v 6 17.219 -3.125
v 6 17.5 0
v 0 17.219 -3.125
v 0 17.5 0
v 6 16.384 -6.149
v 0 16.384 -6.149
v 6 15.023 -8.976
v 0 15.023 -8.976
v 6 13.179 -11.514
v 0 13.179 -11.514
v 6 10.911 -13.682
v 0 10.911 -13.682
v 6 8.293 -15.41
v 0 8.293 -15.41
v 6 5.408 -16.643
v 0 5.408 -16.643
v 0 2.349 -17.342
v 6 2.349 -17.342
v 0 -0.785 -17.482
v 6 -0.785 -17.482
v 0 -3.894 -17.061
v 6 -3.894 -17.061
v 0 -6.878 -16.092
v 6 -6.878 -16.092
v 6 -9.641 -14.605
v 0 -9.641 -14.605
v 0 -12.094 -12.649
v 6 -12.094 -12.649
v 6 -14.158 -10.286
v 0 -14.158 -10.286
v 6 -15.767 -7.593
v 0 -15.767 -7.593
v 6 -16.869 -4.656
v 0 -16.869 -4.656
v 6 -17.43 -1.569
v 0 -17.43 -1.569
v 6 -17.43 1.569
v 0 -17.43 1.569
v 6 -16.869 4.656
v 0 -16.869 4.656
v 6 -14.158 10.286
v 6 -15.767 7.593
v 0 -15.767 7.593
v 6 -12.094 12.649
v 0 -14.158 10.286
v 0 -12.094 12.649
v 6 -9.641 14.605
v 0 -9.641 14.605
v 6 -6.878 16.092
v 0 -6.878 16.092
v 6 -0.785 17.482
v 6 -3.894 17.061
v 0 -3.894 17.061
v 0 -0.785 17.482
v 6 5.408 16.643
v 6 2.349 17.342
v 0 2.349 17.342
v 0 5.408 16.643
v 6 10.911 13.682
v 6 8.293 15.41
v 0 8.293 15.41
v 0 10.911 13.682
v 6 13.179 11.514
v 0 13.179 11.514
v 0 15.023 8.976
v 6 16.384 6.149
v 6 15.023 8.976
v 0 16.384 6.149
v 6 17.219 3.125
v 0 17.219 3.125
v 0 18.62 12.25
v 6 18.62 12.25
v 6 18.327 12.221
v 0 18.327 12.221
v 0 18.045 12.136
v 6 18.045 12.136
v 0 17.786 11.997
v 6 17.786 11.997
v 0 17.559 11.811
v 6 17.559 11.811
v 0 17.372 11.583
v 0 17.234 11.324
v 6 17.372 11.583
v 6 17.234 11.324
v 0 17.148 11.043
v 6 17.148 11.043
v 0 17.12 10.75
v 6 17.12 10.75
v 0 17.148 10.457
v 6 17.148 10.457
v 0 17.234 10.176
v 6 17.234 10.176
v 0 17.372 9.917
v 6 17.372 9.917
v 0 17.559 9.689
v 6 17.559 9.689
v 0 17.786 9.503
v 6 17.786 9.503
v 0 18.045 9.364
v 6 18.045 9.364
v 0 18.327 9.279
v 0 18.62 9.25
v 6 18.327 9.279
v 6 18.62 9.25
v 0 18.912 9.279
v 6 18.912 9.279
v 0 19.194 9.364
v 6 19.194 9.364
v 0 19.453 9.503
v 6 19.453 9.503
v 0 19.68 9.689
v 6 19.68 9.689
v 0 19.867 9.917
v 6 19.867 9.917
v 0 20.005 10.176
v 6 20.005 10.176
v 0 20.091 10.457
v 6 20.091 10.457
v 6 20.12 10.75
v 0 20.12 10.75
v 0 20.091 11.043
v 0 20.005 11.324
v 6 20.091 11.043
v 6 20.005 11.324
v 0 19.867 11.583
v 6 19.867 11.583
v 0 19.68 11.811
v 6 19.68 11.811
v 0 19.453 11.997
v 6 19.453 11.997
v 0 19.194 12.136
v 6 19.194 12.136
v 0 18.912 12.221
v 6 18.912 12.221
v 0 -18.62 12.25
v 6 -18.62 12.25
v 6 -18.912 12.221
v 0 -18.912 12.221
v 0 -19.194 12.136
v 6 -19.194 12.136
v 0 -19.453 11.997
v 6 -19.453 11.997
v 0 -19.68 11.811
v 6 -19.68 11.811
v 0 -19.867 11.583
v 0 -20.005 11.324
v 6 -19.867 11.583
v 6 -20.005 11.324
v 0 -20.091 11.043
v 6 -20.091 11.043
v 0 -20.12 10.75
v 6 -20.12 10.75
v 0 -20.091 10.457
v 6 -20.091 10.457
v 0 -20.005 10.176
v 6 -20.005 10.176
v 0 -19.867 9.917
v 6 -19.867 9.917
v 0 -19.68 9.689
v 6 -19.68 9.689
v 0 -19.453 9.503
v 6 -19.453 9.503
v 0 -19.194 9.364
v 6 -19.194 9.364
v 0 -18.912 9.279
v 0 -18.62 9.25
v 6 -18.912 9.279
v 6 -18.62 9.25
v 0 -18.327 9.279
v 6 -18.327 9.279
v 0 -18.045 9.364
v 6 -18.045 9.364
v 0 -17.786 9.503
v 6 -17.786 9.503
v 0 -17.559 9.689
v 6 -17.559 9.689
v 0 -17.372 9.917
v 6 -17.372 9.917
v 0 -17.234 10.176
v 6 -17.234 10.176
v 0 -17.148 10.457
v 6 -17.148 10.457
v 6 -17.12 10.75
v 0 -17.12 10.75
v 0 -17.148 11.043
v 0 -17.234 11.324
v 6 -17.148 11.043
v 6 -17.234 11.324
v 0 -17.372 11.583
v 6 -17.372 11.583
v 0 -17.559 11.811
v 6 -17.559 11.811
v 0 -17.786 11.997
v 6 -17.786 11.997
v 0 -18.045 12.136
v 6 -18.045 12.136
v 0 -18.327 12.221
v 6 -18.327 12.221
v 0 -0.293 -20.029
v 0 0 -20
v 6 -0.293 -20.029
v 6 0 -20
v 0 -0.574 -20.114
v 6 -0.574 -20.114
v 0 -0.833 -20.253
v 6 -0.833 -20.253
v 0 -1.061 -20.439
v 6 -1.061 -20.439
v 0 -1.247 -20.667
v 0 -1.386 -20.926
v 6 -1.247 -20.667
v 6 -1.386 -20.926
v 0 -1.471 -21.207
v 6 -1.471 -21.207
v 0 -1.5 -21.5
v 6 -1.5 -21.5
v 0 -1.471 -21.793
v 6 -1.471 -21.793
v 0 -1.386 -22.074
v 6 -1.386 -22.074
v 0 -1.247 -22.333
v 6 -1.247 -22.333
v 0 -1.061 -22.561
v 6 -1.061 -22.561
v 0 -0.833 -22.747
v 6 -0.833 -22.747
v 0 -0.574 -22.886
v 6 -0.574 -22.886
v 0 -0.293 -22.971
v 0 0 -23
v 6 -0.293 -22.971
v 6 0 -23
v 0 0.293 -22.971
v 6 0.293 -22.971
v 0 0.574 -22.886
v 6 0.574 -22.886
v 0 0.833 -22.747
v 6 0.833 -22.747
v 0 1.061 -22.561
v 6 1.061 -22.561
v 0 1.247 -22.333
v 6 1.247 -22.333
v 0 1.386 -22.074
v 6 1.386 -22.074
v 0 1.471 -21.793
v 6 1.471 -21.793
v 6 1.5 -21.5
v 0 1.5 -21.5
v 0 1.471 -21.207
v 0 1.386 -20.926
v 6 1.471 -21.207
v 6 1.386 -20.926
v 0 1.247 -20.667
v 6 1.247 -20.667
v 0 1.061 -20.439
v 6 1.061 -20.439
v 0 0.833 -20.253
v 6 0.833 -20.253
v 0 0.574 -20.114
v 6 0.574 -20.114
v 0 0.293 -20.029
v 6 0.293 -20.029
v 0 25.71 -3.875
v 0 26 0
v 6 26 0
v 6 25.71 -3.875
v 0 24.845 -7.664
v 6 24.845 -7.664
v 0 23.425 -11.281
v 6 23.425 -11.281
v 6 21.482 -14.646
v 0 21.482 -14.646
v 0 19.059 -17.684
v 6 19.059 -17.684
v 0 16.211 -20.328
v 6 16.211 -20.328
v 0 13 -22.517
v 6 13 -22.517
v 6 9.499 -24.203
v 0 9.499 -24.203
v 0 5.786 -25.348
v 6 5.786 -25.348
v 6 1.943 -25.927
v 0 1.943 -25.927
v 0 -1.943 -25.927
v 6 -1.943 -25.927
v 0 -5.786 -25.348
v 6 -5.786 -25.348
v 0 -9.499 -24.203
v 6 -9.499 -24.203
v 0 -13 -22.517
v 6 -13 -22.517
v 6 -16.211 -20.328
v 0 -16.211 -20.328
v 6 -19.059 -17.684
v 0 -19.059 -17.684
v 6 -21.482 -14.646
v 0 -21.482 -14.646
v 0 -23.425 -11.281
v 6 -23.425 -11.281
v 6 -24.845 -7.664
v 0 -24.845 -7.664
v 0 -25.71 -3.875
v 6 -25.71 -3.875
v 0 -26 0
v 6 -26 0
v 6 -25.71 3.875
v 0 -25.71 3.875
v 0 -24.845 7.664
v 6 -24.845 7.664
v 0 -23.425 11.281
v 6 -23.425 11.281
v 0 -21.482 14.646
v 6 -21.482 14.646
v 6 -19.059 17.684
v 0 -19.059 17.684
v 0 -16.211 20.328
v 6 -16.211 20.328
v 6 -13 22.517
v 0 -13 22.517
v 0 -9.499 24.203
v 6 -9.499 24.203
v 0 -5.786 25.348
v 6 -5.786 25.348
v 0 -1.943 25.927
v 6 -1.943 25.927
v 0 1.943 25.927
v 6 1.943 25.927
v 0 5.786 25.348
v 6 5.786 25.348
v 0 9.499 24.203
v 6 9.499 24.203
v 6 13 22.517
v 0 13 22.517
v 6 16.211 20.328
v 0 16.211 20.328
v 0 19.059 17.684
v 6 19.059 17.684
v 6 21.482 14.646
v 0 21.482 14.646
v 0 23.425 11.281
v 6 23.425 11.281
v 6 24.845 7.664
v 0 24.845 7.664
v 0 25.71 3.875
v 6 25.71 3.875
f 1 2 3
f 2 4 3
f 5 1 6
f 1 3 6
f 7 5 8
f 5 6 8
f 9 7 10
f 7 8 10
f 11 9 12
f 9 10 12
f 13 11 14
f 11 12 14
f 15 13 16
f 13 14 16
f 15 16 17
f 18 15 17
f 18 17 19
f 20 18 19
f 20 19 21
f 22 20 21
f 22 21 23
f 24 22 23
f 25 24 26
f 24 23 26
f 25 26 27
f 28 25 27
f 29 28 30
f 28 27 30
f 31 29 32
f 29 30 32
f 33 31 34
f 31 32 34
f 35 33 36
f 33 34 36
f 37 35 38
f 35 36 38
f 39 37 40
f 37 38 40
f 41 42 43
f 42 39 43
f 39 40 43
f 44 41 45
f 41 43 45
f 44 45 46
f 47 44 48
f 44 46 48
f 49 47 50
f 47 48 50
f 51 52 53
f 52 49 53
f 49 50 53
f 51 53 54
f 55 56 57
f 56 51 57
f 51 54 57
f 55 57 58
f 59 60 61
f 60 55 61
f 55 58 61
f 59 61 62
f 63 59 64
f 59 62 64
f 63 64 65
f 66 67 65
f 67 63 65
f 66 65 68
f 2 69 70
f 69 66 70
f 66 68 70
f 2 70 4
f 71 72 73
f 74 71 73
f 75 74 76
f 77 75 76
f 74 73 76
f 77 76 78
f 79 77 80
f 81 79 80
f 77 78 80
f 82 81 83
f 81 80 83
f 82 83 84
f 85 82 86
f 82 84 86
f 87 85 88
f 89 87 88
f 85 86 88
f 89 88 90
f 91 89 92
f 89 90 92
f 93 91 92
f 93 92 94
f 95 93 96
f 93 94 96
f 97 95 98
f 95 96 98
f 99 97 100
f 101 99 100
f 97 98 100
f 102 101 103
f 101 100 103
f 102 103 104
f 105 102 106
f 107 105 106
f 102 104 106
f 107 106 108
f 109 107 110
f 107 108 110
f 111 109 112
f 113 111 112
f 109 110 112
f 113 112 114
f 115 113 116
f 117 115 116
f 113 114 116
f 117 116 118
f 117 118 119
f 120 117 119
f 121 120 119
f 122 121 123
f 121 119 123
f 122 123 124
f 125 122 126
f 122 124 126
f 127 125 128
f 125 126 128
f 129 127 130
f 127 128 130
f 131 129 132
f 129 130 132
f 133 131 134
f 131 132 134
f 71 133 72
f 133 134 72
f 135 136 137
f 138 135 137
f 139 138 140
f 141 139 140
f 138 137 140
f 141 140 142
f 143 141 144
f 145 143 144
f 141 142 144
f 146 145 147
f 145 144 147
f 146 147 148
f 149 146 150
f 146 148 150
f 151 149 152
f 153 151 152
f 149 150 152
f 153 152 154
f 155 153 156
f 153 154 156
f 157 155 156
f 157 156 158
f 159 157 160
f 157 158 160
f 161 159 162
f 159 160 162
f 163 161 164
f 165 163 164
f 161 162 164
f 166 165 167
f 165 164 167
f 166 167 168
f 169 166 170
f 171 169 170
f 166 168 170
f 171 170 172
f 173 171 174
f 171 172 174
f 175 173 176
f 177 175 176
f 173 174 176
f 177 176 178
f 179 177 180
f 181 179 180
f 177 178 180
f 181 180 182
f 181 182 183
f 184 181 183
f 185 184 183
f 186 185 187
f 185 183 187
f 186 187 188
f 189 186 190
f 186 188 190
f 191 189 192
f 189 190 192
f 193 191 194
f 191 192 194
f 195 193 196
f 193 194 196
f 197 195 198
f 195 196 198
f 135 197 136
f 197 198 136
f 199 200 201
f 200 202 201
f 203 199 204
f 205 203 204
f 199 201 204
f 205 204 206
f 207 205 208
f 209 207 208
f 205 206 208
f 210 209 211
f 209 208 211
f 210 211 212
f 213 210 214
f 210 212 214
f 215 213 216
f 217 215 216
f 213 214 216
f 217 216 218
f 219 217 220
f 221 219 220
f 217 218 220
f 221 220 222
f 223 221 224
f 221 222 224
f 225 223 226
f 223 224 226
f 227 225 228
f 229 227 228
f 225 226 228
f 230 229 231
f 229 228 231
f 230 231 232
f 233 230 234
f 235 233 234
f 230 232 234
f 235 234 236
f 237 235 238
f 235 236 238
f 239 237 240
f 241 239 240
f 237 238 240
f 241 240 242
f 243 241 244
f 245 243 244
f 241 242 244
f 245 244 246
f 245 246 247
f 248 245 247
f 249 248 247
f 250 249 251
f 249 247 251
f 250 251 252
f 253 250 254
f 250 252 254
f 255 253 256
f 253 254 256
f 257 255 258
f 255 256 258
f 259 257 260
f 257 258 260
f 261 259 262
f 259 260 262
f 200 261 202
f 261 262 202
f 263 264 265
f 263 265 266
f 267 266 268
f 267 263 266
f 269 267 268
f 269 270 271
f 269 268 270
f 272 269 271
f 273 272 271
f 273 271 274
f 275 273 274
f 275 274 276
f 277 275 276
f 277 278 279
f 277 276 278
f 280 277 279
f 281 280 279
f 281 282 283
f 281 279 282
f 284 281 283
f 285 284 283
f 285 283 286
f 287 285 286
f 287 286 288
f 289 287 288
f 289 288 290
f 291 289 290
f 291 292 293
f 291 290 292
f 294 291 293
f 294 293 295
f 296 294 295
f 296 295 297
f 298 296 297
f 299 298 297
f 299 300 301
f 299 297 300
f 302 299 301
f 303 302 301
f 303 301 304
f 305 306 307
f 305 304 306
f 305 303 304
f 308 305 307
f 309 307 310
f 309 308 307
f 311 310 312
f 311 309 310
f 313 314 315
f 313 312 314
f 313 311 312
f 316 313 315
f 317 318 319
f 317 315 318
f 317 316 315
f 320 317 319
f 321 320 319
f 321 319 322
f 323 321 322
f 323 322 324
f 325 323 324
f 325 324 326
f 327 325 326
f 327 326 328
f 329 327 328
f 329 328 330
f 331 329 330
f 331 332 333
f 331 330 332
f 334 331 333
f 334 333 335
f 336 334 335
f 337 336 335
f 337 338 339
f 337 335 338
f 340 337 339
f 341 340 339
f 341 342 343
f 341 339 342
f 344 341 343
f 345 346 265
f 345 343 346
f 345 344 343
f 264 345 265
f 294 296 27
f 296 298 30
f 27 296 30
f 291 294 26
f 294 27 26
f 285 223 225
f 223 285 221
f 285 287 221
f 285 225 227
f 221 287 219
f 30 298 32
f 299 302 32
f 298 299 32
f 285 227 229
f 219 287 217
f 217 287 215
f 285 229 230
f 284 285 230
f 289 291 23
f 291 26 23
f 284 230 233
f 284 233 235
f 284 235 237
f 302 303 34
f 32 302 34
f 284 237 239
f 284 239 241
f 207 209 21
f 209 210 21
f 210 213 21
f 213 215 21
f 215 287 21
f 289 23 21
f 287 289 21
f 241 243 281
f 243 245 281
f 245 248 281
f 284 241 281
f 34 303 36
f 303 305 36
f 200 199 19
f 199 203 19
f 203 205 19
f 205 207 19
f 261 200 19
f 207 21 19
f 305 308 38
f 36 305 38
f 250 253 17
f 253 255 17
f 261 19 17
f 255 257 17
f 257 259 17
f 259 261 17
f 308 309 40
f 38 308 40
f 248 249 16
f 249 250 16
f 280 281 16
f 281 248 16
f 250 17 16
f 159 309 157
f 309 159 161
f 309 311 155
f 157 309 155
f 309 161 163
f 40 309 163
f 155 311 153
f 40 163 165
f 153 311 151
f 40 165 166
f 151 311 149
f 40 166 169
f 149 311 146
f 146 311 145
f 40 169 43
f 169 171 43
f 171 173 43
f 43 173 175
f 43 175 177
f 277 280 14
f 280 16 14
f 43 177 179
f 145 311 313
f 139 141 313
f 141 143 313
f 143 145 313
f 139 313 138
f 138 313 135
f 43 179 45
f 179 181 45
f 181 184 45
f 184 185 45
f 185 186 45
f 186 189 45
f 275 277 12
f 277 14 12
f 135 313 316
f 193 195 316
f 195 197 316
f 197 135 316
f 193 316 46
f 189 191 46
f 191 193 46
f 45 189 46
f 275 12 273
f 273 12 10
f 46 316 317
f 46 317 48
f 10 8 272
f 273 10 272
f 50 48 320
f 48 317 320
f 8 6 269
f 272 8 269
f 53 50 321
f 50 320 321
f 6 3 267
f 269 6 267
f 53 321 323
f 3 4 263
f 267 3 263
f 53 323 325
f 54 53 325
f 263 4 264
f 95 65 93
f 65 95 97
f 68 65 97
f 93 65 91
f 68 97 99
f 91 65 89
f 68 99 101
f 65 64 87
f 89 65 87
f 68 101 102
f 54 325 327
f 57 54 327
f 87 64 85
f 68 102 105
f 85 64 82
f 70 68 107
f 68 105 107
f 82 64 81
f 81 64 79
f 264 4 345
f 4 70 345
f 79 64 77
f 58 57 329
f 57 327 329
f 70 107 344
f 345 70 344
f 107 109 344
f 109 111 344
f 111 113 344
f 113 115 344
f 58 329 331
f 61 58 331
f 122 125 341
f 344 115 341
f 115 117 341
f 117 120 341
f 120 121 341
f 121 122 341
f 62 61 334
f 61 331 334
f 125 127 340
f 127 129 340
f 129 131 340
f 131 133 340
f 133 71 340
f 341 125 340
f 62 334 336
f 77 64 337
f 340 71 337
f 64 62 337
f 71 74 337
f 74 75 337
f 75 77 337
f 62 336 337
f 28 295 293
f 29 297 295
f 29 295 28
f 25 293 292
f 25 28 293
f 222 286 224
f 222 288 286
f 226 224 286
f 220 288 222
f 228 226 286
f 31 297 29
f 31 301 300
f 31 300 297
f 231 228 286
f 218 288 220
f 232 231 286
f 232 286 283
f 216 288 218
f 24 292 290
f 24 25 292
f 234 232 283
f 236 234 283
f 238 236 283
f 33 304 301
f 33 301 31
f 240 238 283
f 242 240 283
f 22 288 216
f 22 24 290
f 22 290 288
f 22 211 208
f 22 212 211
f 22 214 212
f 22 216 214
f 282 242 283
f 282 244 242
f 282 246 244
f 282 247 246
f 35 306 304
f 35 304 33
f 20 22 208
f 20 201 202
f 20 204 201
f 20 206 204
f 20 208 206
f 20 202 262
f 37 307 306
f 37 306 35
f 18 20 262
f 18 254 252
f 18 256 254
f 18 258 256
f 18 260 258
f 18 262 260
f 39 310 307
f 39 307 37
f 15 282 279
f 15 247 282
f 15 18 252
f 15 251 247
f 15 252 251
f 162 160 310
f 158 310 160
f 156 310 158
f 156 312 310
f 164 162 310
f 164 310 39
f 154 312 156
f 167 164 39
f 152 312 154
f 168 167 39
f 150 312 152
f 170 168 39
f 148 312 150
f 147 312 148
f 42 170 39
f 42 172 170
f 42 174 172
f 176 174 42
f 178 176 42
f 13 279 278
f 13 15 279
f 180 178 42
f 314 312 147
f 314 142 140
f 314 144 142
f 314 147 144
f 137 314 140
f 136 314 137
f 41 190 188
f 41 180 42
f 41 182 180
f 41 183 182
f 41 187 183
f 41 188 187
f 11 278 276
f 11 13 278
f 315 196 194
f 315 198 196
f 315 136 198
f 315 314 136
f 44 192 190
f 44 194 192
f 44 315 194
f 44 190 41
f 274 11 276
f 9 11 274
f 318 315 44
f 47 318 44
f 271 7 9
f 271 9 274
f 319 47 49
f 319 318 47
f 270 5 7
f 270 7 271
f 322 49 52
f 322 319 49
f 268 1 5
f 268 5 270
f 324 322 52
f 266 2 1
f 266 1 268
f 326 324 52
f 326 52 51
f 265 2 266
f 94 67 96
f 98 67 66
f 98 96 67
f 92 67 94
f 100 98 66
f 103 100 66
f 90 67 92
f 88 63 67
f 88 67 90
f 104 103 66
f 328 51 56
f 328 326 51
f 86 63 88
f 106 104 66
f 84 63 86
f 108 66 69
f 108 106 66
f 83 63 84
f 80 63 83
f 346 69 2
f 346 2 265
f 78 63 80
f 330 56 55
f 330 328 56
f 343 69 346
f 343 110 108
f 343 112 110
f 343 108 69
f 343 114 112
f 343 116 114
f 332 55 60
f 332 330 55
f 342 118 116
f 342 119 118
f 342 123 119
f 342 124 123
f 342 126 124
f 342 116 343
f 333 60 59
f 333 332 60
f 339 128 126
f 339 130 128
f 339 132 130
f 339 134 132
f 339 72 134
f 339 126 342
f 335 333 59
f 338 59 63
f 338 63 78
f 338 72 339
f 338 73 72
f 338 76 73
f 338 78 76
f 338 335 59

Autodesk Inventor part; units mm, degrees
ref_plane "YZ Plane" through (0, 0, 0) normal (1, 0, 0) x (0, 1, 0)
ref_plane "XZ Plane" through (0, 0, 0) normal (0, 1, 0) x (-1, 0, 0)
ref_plane "XY Plane" through (0, 0, 0) normal (0, 0, 1) x (1, 0, 0)
sketch "Sketch1" plane through (0, 0, 0) normal (1, 0, 0) x (0, 1, 0)
  circle A0 centre (0, 0) radius 26
  circle A1 centre (0, 0) radius 17.5
  line L0 (9.2645, 0) -> (-12.3906, 0) construction
  circle A2 centre (0, 0) radius 21.5 construction
  line L1 (0, 0) -> (0, -36.6713) construction
  point P0 (0, -21.5)
  point P1 (18.6195, 10.75)
  point P2 (-18.6195, 10.75)
  dimension "d1" = 43
  dimension "d0" = 35
  dimension "d2" = 52
  dimension "d5" = 360
extrude "Extrusion1" add sketch "Sketch1" along normal blind 6
hole "Hole1" at (0, 0, -21.5) at (0, 18.6195, 10.75) at (0, -18.6195, 10.75) direction (1, 0, 0) diameter 3 depth 10 tip angle 118
properties part number "Soporte2_Rodamientos"
